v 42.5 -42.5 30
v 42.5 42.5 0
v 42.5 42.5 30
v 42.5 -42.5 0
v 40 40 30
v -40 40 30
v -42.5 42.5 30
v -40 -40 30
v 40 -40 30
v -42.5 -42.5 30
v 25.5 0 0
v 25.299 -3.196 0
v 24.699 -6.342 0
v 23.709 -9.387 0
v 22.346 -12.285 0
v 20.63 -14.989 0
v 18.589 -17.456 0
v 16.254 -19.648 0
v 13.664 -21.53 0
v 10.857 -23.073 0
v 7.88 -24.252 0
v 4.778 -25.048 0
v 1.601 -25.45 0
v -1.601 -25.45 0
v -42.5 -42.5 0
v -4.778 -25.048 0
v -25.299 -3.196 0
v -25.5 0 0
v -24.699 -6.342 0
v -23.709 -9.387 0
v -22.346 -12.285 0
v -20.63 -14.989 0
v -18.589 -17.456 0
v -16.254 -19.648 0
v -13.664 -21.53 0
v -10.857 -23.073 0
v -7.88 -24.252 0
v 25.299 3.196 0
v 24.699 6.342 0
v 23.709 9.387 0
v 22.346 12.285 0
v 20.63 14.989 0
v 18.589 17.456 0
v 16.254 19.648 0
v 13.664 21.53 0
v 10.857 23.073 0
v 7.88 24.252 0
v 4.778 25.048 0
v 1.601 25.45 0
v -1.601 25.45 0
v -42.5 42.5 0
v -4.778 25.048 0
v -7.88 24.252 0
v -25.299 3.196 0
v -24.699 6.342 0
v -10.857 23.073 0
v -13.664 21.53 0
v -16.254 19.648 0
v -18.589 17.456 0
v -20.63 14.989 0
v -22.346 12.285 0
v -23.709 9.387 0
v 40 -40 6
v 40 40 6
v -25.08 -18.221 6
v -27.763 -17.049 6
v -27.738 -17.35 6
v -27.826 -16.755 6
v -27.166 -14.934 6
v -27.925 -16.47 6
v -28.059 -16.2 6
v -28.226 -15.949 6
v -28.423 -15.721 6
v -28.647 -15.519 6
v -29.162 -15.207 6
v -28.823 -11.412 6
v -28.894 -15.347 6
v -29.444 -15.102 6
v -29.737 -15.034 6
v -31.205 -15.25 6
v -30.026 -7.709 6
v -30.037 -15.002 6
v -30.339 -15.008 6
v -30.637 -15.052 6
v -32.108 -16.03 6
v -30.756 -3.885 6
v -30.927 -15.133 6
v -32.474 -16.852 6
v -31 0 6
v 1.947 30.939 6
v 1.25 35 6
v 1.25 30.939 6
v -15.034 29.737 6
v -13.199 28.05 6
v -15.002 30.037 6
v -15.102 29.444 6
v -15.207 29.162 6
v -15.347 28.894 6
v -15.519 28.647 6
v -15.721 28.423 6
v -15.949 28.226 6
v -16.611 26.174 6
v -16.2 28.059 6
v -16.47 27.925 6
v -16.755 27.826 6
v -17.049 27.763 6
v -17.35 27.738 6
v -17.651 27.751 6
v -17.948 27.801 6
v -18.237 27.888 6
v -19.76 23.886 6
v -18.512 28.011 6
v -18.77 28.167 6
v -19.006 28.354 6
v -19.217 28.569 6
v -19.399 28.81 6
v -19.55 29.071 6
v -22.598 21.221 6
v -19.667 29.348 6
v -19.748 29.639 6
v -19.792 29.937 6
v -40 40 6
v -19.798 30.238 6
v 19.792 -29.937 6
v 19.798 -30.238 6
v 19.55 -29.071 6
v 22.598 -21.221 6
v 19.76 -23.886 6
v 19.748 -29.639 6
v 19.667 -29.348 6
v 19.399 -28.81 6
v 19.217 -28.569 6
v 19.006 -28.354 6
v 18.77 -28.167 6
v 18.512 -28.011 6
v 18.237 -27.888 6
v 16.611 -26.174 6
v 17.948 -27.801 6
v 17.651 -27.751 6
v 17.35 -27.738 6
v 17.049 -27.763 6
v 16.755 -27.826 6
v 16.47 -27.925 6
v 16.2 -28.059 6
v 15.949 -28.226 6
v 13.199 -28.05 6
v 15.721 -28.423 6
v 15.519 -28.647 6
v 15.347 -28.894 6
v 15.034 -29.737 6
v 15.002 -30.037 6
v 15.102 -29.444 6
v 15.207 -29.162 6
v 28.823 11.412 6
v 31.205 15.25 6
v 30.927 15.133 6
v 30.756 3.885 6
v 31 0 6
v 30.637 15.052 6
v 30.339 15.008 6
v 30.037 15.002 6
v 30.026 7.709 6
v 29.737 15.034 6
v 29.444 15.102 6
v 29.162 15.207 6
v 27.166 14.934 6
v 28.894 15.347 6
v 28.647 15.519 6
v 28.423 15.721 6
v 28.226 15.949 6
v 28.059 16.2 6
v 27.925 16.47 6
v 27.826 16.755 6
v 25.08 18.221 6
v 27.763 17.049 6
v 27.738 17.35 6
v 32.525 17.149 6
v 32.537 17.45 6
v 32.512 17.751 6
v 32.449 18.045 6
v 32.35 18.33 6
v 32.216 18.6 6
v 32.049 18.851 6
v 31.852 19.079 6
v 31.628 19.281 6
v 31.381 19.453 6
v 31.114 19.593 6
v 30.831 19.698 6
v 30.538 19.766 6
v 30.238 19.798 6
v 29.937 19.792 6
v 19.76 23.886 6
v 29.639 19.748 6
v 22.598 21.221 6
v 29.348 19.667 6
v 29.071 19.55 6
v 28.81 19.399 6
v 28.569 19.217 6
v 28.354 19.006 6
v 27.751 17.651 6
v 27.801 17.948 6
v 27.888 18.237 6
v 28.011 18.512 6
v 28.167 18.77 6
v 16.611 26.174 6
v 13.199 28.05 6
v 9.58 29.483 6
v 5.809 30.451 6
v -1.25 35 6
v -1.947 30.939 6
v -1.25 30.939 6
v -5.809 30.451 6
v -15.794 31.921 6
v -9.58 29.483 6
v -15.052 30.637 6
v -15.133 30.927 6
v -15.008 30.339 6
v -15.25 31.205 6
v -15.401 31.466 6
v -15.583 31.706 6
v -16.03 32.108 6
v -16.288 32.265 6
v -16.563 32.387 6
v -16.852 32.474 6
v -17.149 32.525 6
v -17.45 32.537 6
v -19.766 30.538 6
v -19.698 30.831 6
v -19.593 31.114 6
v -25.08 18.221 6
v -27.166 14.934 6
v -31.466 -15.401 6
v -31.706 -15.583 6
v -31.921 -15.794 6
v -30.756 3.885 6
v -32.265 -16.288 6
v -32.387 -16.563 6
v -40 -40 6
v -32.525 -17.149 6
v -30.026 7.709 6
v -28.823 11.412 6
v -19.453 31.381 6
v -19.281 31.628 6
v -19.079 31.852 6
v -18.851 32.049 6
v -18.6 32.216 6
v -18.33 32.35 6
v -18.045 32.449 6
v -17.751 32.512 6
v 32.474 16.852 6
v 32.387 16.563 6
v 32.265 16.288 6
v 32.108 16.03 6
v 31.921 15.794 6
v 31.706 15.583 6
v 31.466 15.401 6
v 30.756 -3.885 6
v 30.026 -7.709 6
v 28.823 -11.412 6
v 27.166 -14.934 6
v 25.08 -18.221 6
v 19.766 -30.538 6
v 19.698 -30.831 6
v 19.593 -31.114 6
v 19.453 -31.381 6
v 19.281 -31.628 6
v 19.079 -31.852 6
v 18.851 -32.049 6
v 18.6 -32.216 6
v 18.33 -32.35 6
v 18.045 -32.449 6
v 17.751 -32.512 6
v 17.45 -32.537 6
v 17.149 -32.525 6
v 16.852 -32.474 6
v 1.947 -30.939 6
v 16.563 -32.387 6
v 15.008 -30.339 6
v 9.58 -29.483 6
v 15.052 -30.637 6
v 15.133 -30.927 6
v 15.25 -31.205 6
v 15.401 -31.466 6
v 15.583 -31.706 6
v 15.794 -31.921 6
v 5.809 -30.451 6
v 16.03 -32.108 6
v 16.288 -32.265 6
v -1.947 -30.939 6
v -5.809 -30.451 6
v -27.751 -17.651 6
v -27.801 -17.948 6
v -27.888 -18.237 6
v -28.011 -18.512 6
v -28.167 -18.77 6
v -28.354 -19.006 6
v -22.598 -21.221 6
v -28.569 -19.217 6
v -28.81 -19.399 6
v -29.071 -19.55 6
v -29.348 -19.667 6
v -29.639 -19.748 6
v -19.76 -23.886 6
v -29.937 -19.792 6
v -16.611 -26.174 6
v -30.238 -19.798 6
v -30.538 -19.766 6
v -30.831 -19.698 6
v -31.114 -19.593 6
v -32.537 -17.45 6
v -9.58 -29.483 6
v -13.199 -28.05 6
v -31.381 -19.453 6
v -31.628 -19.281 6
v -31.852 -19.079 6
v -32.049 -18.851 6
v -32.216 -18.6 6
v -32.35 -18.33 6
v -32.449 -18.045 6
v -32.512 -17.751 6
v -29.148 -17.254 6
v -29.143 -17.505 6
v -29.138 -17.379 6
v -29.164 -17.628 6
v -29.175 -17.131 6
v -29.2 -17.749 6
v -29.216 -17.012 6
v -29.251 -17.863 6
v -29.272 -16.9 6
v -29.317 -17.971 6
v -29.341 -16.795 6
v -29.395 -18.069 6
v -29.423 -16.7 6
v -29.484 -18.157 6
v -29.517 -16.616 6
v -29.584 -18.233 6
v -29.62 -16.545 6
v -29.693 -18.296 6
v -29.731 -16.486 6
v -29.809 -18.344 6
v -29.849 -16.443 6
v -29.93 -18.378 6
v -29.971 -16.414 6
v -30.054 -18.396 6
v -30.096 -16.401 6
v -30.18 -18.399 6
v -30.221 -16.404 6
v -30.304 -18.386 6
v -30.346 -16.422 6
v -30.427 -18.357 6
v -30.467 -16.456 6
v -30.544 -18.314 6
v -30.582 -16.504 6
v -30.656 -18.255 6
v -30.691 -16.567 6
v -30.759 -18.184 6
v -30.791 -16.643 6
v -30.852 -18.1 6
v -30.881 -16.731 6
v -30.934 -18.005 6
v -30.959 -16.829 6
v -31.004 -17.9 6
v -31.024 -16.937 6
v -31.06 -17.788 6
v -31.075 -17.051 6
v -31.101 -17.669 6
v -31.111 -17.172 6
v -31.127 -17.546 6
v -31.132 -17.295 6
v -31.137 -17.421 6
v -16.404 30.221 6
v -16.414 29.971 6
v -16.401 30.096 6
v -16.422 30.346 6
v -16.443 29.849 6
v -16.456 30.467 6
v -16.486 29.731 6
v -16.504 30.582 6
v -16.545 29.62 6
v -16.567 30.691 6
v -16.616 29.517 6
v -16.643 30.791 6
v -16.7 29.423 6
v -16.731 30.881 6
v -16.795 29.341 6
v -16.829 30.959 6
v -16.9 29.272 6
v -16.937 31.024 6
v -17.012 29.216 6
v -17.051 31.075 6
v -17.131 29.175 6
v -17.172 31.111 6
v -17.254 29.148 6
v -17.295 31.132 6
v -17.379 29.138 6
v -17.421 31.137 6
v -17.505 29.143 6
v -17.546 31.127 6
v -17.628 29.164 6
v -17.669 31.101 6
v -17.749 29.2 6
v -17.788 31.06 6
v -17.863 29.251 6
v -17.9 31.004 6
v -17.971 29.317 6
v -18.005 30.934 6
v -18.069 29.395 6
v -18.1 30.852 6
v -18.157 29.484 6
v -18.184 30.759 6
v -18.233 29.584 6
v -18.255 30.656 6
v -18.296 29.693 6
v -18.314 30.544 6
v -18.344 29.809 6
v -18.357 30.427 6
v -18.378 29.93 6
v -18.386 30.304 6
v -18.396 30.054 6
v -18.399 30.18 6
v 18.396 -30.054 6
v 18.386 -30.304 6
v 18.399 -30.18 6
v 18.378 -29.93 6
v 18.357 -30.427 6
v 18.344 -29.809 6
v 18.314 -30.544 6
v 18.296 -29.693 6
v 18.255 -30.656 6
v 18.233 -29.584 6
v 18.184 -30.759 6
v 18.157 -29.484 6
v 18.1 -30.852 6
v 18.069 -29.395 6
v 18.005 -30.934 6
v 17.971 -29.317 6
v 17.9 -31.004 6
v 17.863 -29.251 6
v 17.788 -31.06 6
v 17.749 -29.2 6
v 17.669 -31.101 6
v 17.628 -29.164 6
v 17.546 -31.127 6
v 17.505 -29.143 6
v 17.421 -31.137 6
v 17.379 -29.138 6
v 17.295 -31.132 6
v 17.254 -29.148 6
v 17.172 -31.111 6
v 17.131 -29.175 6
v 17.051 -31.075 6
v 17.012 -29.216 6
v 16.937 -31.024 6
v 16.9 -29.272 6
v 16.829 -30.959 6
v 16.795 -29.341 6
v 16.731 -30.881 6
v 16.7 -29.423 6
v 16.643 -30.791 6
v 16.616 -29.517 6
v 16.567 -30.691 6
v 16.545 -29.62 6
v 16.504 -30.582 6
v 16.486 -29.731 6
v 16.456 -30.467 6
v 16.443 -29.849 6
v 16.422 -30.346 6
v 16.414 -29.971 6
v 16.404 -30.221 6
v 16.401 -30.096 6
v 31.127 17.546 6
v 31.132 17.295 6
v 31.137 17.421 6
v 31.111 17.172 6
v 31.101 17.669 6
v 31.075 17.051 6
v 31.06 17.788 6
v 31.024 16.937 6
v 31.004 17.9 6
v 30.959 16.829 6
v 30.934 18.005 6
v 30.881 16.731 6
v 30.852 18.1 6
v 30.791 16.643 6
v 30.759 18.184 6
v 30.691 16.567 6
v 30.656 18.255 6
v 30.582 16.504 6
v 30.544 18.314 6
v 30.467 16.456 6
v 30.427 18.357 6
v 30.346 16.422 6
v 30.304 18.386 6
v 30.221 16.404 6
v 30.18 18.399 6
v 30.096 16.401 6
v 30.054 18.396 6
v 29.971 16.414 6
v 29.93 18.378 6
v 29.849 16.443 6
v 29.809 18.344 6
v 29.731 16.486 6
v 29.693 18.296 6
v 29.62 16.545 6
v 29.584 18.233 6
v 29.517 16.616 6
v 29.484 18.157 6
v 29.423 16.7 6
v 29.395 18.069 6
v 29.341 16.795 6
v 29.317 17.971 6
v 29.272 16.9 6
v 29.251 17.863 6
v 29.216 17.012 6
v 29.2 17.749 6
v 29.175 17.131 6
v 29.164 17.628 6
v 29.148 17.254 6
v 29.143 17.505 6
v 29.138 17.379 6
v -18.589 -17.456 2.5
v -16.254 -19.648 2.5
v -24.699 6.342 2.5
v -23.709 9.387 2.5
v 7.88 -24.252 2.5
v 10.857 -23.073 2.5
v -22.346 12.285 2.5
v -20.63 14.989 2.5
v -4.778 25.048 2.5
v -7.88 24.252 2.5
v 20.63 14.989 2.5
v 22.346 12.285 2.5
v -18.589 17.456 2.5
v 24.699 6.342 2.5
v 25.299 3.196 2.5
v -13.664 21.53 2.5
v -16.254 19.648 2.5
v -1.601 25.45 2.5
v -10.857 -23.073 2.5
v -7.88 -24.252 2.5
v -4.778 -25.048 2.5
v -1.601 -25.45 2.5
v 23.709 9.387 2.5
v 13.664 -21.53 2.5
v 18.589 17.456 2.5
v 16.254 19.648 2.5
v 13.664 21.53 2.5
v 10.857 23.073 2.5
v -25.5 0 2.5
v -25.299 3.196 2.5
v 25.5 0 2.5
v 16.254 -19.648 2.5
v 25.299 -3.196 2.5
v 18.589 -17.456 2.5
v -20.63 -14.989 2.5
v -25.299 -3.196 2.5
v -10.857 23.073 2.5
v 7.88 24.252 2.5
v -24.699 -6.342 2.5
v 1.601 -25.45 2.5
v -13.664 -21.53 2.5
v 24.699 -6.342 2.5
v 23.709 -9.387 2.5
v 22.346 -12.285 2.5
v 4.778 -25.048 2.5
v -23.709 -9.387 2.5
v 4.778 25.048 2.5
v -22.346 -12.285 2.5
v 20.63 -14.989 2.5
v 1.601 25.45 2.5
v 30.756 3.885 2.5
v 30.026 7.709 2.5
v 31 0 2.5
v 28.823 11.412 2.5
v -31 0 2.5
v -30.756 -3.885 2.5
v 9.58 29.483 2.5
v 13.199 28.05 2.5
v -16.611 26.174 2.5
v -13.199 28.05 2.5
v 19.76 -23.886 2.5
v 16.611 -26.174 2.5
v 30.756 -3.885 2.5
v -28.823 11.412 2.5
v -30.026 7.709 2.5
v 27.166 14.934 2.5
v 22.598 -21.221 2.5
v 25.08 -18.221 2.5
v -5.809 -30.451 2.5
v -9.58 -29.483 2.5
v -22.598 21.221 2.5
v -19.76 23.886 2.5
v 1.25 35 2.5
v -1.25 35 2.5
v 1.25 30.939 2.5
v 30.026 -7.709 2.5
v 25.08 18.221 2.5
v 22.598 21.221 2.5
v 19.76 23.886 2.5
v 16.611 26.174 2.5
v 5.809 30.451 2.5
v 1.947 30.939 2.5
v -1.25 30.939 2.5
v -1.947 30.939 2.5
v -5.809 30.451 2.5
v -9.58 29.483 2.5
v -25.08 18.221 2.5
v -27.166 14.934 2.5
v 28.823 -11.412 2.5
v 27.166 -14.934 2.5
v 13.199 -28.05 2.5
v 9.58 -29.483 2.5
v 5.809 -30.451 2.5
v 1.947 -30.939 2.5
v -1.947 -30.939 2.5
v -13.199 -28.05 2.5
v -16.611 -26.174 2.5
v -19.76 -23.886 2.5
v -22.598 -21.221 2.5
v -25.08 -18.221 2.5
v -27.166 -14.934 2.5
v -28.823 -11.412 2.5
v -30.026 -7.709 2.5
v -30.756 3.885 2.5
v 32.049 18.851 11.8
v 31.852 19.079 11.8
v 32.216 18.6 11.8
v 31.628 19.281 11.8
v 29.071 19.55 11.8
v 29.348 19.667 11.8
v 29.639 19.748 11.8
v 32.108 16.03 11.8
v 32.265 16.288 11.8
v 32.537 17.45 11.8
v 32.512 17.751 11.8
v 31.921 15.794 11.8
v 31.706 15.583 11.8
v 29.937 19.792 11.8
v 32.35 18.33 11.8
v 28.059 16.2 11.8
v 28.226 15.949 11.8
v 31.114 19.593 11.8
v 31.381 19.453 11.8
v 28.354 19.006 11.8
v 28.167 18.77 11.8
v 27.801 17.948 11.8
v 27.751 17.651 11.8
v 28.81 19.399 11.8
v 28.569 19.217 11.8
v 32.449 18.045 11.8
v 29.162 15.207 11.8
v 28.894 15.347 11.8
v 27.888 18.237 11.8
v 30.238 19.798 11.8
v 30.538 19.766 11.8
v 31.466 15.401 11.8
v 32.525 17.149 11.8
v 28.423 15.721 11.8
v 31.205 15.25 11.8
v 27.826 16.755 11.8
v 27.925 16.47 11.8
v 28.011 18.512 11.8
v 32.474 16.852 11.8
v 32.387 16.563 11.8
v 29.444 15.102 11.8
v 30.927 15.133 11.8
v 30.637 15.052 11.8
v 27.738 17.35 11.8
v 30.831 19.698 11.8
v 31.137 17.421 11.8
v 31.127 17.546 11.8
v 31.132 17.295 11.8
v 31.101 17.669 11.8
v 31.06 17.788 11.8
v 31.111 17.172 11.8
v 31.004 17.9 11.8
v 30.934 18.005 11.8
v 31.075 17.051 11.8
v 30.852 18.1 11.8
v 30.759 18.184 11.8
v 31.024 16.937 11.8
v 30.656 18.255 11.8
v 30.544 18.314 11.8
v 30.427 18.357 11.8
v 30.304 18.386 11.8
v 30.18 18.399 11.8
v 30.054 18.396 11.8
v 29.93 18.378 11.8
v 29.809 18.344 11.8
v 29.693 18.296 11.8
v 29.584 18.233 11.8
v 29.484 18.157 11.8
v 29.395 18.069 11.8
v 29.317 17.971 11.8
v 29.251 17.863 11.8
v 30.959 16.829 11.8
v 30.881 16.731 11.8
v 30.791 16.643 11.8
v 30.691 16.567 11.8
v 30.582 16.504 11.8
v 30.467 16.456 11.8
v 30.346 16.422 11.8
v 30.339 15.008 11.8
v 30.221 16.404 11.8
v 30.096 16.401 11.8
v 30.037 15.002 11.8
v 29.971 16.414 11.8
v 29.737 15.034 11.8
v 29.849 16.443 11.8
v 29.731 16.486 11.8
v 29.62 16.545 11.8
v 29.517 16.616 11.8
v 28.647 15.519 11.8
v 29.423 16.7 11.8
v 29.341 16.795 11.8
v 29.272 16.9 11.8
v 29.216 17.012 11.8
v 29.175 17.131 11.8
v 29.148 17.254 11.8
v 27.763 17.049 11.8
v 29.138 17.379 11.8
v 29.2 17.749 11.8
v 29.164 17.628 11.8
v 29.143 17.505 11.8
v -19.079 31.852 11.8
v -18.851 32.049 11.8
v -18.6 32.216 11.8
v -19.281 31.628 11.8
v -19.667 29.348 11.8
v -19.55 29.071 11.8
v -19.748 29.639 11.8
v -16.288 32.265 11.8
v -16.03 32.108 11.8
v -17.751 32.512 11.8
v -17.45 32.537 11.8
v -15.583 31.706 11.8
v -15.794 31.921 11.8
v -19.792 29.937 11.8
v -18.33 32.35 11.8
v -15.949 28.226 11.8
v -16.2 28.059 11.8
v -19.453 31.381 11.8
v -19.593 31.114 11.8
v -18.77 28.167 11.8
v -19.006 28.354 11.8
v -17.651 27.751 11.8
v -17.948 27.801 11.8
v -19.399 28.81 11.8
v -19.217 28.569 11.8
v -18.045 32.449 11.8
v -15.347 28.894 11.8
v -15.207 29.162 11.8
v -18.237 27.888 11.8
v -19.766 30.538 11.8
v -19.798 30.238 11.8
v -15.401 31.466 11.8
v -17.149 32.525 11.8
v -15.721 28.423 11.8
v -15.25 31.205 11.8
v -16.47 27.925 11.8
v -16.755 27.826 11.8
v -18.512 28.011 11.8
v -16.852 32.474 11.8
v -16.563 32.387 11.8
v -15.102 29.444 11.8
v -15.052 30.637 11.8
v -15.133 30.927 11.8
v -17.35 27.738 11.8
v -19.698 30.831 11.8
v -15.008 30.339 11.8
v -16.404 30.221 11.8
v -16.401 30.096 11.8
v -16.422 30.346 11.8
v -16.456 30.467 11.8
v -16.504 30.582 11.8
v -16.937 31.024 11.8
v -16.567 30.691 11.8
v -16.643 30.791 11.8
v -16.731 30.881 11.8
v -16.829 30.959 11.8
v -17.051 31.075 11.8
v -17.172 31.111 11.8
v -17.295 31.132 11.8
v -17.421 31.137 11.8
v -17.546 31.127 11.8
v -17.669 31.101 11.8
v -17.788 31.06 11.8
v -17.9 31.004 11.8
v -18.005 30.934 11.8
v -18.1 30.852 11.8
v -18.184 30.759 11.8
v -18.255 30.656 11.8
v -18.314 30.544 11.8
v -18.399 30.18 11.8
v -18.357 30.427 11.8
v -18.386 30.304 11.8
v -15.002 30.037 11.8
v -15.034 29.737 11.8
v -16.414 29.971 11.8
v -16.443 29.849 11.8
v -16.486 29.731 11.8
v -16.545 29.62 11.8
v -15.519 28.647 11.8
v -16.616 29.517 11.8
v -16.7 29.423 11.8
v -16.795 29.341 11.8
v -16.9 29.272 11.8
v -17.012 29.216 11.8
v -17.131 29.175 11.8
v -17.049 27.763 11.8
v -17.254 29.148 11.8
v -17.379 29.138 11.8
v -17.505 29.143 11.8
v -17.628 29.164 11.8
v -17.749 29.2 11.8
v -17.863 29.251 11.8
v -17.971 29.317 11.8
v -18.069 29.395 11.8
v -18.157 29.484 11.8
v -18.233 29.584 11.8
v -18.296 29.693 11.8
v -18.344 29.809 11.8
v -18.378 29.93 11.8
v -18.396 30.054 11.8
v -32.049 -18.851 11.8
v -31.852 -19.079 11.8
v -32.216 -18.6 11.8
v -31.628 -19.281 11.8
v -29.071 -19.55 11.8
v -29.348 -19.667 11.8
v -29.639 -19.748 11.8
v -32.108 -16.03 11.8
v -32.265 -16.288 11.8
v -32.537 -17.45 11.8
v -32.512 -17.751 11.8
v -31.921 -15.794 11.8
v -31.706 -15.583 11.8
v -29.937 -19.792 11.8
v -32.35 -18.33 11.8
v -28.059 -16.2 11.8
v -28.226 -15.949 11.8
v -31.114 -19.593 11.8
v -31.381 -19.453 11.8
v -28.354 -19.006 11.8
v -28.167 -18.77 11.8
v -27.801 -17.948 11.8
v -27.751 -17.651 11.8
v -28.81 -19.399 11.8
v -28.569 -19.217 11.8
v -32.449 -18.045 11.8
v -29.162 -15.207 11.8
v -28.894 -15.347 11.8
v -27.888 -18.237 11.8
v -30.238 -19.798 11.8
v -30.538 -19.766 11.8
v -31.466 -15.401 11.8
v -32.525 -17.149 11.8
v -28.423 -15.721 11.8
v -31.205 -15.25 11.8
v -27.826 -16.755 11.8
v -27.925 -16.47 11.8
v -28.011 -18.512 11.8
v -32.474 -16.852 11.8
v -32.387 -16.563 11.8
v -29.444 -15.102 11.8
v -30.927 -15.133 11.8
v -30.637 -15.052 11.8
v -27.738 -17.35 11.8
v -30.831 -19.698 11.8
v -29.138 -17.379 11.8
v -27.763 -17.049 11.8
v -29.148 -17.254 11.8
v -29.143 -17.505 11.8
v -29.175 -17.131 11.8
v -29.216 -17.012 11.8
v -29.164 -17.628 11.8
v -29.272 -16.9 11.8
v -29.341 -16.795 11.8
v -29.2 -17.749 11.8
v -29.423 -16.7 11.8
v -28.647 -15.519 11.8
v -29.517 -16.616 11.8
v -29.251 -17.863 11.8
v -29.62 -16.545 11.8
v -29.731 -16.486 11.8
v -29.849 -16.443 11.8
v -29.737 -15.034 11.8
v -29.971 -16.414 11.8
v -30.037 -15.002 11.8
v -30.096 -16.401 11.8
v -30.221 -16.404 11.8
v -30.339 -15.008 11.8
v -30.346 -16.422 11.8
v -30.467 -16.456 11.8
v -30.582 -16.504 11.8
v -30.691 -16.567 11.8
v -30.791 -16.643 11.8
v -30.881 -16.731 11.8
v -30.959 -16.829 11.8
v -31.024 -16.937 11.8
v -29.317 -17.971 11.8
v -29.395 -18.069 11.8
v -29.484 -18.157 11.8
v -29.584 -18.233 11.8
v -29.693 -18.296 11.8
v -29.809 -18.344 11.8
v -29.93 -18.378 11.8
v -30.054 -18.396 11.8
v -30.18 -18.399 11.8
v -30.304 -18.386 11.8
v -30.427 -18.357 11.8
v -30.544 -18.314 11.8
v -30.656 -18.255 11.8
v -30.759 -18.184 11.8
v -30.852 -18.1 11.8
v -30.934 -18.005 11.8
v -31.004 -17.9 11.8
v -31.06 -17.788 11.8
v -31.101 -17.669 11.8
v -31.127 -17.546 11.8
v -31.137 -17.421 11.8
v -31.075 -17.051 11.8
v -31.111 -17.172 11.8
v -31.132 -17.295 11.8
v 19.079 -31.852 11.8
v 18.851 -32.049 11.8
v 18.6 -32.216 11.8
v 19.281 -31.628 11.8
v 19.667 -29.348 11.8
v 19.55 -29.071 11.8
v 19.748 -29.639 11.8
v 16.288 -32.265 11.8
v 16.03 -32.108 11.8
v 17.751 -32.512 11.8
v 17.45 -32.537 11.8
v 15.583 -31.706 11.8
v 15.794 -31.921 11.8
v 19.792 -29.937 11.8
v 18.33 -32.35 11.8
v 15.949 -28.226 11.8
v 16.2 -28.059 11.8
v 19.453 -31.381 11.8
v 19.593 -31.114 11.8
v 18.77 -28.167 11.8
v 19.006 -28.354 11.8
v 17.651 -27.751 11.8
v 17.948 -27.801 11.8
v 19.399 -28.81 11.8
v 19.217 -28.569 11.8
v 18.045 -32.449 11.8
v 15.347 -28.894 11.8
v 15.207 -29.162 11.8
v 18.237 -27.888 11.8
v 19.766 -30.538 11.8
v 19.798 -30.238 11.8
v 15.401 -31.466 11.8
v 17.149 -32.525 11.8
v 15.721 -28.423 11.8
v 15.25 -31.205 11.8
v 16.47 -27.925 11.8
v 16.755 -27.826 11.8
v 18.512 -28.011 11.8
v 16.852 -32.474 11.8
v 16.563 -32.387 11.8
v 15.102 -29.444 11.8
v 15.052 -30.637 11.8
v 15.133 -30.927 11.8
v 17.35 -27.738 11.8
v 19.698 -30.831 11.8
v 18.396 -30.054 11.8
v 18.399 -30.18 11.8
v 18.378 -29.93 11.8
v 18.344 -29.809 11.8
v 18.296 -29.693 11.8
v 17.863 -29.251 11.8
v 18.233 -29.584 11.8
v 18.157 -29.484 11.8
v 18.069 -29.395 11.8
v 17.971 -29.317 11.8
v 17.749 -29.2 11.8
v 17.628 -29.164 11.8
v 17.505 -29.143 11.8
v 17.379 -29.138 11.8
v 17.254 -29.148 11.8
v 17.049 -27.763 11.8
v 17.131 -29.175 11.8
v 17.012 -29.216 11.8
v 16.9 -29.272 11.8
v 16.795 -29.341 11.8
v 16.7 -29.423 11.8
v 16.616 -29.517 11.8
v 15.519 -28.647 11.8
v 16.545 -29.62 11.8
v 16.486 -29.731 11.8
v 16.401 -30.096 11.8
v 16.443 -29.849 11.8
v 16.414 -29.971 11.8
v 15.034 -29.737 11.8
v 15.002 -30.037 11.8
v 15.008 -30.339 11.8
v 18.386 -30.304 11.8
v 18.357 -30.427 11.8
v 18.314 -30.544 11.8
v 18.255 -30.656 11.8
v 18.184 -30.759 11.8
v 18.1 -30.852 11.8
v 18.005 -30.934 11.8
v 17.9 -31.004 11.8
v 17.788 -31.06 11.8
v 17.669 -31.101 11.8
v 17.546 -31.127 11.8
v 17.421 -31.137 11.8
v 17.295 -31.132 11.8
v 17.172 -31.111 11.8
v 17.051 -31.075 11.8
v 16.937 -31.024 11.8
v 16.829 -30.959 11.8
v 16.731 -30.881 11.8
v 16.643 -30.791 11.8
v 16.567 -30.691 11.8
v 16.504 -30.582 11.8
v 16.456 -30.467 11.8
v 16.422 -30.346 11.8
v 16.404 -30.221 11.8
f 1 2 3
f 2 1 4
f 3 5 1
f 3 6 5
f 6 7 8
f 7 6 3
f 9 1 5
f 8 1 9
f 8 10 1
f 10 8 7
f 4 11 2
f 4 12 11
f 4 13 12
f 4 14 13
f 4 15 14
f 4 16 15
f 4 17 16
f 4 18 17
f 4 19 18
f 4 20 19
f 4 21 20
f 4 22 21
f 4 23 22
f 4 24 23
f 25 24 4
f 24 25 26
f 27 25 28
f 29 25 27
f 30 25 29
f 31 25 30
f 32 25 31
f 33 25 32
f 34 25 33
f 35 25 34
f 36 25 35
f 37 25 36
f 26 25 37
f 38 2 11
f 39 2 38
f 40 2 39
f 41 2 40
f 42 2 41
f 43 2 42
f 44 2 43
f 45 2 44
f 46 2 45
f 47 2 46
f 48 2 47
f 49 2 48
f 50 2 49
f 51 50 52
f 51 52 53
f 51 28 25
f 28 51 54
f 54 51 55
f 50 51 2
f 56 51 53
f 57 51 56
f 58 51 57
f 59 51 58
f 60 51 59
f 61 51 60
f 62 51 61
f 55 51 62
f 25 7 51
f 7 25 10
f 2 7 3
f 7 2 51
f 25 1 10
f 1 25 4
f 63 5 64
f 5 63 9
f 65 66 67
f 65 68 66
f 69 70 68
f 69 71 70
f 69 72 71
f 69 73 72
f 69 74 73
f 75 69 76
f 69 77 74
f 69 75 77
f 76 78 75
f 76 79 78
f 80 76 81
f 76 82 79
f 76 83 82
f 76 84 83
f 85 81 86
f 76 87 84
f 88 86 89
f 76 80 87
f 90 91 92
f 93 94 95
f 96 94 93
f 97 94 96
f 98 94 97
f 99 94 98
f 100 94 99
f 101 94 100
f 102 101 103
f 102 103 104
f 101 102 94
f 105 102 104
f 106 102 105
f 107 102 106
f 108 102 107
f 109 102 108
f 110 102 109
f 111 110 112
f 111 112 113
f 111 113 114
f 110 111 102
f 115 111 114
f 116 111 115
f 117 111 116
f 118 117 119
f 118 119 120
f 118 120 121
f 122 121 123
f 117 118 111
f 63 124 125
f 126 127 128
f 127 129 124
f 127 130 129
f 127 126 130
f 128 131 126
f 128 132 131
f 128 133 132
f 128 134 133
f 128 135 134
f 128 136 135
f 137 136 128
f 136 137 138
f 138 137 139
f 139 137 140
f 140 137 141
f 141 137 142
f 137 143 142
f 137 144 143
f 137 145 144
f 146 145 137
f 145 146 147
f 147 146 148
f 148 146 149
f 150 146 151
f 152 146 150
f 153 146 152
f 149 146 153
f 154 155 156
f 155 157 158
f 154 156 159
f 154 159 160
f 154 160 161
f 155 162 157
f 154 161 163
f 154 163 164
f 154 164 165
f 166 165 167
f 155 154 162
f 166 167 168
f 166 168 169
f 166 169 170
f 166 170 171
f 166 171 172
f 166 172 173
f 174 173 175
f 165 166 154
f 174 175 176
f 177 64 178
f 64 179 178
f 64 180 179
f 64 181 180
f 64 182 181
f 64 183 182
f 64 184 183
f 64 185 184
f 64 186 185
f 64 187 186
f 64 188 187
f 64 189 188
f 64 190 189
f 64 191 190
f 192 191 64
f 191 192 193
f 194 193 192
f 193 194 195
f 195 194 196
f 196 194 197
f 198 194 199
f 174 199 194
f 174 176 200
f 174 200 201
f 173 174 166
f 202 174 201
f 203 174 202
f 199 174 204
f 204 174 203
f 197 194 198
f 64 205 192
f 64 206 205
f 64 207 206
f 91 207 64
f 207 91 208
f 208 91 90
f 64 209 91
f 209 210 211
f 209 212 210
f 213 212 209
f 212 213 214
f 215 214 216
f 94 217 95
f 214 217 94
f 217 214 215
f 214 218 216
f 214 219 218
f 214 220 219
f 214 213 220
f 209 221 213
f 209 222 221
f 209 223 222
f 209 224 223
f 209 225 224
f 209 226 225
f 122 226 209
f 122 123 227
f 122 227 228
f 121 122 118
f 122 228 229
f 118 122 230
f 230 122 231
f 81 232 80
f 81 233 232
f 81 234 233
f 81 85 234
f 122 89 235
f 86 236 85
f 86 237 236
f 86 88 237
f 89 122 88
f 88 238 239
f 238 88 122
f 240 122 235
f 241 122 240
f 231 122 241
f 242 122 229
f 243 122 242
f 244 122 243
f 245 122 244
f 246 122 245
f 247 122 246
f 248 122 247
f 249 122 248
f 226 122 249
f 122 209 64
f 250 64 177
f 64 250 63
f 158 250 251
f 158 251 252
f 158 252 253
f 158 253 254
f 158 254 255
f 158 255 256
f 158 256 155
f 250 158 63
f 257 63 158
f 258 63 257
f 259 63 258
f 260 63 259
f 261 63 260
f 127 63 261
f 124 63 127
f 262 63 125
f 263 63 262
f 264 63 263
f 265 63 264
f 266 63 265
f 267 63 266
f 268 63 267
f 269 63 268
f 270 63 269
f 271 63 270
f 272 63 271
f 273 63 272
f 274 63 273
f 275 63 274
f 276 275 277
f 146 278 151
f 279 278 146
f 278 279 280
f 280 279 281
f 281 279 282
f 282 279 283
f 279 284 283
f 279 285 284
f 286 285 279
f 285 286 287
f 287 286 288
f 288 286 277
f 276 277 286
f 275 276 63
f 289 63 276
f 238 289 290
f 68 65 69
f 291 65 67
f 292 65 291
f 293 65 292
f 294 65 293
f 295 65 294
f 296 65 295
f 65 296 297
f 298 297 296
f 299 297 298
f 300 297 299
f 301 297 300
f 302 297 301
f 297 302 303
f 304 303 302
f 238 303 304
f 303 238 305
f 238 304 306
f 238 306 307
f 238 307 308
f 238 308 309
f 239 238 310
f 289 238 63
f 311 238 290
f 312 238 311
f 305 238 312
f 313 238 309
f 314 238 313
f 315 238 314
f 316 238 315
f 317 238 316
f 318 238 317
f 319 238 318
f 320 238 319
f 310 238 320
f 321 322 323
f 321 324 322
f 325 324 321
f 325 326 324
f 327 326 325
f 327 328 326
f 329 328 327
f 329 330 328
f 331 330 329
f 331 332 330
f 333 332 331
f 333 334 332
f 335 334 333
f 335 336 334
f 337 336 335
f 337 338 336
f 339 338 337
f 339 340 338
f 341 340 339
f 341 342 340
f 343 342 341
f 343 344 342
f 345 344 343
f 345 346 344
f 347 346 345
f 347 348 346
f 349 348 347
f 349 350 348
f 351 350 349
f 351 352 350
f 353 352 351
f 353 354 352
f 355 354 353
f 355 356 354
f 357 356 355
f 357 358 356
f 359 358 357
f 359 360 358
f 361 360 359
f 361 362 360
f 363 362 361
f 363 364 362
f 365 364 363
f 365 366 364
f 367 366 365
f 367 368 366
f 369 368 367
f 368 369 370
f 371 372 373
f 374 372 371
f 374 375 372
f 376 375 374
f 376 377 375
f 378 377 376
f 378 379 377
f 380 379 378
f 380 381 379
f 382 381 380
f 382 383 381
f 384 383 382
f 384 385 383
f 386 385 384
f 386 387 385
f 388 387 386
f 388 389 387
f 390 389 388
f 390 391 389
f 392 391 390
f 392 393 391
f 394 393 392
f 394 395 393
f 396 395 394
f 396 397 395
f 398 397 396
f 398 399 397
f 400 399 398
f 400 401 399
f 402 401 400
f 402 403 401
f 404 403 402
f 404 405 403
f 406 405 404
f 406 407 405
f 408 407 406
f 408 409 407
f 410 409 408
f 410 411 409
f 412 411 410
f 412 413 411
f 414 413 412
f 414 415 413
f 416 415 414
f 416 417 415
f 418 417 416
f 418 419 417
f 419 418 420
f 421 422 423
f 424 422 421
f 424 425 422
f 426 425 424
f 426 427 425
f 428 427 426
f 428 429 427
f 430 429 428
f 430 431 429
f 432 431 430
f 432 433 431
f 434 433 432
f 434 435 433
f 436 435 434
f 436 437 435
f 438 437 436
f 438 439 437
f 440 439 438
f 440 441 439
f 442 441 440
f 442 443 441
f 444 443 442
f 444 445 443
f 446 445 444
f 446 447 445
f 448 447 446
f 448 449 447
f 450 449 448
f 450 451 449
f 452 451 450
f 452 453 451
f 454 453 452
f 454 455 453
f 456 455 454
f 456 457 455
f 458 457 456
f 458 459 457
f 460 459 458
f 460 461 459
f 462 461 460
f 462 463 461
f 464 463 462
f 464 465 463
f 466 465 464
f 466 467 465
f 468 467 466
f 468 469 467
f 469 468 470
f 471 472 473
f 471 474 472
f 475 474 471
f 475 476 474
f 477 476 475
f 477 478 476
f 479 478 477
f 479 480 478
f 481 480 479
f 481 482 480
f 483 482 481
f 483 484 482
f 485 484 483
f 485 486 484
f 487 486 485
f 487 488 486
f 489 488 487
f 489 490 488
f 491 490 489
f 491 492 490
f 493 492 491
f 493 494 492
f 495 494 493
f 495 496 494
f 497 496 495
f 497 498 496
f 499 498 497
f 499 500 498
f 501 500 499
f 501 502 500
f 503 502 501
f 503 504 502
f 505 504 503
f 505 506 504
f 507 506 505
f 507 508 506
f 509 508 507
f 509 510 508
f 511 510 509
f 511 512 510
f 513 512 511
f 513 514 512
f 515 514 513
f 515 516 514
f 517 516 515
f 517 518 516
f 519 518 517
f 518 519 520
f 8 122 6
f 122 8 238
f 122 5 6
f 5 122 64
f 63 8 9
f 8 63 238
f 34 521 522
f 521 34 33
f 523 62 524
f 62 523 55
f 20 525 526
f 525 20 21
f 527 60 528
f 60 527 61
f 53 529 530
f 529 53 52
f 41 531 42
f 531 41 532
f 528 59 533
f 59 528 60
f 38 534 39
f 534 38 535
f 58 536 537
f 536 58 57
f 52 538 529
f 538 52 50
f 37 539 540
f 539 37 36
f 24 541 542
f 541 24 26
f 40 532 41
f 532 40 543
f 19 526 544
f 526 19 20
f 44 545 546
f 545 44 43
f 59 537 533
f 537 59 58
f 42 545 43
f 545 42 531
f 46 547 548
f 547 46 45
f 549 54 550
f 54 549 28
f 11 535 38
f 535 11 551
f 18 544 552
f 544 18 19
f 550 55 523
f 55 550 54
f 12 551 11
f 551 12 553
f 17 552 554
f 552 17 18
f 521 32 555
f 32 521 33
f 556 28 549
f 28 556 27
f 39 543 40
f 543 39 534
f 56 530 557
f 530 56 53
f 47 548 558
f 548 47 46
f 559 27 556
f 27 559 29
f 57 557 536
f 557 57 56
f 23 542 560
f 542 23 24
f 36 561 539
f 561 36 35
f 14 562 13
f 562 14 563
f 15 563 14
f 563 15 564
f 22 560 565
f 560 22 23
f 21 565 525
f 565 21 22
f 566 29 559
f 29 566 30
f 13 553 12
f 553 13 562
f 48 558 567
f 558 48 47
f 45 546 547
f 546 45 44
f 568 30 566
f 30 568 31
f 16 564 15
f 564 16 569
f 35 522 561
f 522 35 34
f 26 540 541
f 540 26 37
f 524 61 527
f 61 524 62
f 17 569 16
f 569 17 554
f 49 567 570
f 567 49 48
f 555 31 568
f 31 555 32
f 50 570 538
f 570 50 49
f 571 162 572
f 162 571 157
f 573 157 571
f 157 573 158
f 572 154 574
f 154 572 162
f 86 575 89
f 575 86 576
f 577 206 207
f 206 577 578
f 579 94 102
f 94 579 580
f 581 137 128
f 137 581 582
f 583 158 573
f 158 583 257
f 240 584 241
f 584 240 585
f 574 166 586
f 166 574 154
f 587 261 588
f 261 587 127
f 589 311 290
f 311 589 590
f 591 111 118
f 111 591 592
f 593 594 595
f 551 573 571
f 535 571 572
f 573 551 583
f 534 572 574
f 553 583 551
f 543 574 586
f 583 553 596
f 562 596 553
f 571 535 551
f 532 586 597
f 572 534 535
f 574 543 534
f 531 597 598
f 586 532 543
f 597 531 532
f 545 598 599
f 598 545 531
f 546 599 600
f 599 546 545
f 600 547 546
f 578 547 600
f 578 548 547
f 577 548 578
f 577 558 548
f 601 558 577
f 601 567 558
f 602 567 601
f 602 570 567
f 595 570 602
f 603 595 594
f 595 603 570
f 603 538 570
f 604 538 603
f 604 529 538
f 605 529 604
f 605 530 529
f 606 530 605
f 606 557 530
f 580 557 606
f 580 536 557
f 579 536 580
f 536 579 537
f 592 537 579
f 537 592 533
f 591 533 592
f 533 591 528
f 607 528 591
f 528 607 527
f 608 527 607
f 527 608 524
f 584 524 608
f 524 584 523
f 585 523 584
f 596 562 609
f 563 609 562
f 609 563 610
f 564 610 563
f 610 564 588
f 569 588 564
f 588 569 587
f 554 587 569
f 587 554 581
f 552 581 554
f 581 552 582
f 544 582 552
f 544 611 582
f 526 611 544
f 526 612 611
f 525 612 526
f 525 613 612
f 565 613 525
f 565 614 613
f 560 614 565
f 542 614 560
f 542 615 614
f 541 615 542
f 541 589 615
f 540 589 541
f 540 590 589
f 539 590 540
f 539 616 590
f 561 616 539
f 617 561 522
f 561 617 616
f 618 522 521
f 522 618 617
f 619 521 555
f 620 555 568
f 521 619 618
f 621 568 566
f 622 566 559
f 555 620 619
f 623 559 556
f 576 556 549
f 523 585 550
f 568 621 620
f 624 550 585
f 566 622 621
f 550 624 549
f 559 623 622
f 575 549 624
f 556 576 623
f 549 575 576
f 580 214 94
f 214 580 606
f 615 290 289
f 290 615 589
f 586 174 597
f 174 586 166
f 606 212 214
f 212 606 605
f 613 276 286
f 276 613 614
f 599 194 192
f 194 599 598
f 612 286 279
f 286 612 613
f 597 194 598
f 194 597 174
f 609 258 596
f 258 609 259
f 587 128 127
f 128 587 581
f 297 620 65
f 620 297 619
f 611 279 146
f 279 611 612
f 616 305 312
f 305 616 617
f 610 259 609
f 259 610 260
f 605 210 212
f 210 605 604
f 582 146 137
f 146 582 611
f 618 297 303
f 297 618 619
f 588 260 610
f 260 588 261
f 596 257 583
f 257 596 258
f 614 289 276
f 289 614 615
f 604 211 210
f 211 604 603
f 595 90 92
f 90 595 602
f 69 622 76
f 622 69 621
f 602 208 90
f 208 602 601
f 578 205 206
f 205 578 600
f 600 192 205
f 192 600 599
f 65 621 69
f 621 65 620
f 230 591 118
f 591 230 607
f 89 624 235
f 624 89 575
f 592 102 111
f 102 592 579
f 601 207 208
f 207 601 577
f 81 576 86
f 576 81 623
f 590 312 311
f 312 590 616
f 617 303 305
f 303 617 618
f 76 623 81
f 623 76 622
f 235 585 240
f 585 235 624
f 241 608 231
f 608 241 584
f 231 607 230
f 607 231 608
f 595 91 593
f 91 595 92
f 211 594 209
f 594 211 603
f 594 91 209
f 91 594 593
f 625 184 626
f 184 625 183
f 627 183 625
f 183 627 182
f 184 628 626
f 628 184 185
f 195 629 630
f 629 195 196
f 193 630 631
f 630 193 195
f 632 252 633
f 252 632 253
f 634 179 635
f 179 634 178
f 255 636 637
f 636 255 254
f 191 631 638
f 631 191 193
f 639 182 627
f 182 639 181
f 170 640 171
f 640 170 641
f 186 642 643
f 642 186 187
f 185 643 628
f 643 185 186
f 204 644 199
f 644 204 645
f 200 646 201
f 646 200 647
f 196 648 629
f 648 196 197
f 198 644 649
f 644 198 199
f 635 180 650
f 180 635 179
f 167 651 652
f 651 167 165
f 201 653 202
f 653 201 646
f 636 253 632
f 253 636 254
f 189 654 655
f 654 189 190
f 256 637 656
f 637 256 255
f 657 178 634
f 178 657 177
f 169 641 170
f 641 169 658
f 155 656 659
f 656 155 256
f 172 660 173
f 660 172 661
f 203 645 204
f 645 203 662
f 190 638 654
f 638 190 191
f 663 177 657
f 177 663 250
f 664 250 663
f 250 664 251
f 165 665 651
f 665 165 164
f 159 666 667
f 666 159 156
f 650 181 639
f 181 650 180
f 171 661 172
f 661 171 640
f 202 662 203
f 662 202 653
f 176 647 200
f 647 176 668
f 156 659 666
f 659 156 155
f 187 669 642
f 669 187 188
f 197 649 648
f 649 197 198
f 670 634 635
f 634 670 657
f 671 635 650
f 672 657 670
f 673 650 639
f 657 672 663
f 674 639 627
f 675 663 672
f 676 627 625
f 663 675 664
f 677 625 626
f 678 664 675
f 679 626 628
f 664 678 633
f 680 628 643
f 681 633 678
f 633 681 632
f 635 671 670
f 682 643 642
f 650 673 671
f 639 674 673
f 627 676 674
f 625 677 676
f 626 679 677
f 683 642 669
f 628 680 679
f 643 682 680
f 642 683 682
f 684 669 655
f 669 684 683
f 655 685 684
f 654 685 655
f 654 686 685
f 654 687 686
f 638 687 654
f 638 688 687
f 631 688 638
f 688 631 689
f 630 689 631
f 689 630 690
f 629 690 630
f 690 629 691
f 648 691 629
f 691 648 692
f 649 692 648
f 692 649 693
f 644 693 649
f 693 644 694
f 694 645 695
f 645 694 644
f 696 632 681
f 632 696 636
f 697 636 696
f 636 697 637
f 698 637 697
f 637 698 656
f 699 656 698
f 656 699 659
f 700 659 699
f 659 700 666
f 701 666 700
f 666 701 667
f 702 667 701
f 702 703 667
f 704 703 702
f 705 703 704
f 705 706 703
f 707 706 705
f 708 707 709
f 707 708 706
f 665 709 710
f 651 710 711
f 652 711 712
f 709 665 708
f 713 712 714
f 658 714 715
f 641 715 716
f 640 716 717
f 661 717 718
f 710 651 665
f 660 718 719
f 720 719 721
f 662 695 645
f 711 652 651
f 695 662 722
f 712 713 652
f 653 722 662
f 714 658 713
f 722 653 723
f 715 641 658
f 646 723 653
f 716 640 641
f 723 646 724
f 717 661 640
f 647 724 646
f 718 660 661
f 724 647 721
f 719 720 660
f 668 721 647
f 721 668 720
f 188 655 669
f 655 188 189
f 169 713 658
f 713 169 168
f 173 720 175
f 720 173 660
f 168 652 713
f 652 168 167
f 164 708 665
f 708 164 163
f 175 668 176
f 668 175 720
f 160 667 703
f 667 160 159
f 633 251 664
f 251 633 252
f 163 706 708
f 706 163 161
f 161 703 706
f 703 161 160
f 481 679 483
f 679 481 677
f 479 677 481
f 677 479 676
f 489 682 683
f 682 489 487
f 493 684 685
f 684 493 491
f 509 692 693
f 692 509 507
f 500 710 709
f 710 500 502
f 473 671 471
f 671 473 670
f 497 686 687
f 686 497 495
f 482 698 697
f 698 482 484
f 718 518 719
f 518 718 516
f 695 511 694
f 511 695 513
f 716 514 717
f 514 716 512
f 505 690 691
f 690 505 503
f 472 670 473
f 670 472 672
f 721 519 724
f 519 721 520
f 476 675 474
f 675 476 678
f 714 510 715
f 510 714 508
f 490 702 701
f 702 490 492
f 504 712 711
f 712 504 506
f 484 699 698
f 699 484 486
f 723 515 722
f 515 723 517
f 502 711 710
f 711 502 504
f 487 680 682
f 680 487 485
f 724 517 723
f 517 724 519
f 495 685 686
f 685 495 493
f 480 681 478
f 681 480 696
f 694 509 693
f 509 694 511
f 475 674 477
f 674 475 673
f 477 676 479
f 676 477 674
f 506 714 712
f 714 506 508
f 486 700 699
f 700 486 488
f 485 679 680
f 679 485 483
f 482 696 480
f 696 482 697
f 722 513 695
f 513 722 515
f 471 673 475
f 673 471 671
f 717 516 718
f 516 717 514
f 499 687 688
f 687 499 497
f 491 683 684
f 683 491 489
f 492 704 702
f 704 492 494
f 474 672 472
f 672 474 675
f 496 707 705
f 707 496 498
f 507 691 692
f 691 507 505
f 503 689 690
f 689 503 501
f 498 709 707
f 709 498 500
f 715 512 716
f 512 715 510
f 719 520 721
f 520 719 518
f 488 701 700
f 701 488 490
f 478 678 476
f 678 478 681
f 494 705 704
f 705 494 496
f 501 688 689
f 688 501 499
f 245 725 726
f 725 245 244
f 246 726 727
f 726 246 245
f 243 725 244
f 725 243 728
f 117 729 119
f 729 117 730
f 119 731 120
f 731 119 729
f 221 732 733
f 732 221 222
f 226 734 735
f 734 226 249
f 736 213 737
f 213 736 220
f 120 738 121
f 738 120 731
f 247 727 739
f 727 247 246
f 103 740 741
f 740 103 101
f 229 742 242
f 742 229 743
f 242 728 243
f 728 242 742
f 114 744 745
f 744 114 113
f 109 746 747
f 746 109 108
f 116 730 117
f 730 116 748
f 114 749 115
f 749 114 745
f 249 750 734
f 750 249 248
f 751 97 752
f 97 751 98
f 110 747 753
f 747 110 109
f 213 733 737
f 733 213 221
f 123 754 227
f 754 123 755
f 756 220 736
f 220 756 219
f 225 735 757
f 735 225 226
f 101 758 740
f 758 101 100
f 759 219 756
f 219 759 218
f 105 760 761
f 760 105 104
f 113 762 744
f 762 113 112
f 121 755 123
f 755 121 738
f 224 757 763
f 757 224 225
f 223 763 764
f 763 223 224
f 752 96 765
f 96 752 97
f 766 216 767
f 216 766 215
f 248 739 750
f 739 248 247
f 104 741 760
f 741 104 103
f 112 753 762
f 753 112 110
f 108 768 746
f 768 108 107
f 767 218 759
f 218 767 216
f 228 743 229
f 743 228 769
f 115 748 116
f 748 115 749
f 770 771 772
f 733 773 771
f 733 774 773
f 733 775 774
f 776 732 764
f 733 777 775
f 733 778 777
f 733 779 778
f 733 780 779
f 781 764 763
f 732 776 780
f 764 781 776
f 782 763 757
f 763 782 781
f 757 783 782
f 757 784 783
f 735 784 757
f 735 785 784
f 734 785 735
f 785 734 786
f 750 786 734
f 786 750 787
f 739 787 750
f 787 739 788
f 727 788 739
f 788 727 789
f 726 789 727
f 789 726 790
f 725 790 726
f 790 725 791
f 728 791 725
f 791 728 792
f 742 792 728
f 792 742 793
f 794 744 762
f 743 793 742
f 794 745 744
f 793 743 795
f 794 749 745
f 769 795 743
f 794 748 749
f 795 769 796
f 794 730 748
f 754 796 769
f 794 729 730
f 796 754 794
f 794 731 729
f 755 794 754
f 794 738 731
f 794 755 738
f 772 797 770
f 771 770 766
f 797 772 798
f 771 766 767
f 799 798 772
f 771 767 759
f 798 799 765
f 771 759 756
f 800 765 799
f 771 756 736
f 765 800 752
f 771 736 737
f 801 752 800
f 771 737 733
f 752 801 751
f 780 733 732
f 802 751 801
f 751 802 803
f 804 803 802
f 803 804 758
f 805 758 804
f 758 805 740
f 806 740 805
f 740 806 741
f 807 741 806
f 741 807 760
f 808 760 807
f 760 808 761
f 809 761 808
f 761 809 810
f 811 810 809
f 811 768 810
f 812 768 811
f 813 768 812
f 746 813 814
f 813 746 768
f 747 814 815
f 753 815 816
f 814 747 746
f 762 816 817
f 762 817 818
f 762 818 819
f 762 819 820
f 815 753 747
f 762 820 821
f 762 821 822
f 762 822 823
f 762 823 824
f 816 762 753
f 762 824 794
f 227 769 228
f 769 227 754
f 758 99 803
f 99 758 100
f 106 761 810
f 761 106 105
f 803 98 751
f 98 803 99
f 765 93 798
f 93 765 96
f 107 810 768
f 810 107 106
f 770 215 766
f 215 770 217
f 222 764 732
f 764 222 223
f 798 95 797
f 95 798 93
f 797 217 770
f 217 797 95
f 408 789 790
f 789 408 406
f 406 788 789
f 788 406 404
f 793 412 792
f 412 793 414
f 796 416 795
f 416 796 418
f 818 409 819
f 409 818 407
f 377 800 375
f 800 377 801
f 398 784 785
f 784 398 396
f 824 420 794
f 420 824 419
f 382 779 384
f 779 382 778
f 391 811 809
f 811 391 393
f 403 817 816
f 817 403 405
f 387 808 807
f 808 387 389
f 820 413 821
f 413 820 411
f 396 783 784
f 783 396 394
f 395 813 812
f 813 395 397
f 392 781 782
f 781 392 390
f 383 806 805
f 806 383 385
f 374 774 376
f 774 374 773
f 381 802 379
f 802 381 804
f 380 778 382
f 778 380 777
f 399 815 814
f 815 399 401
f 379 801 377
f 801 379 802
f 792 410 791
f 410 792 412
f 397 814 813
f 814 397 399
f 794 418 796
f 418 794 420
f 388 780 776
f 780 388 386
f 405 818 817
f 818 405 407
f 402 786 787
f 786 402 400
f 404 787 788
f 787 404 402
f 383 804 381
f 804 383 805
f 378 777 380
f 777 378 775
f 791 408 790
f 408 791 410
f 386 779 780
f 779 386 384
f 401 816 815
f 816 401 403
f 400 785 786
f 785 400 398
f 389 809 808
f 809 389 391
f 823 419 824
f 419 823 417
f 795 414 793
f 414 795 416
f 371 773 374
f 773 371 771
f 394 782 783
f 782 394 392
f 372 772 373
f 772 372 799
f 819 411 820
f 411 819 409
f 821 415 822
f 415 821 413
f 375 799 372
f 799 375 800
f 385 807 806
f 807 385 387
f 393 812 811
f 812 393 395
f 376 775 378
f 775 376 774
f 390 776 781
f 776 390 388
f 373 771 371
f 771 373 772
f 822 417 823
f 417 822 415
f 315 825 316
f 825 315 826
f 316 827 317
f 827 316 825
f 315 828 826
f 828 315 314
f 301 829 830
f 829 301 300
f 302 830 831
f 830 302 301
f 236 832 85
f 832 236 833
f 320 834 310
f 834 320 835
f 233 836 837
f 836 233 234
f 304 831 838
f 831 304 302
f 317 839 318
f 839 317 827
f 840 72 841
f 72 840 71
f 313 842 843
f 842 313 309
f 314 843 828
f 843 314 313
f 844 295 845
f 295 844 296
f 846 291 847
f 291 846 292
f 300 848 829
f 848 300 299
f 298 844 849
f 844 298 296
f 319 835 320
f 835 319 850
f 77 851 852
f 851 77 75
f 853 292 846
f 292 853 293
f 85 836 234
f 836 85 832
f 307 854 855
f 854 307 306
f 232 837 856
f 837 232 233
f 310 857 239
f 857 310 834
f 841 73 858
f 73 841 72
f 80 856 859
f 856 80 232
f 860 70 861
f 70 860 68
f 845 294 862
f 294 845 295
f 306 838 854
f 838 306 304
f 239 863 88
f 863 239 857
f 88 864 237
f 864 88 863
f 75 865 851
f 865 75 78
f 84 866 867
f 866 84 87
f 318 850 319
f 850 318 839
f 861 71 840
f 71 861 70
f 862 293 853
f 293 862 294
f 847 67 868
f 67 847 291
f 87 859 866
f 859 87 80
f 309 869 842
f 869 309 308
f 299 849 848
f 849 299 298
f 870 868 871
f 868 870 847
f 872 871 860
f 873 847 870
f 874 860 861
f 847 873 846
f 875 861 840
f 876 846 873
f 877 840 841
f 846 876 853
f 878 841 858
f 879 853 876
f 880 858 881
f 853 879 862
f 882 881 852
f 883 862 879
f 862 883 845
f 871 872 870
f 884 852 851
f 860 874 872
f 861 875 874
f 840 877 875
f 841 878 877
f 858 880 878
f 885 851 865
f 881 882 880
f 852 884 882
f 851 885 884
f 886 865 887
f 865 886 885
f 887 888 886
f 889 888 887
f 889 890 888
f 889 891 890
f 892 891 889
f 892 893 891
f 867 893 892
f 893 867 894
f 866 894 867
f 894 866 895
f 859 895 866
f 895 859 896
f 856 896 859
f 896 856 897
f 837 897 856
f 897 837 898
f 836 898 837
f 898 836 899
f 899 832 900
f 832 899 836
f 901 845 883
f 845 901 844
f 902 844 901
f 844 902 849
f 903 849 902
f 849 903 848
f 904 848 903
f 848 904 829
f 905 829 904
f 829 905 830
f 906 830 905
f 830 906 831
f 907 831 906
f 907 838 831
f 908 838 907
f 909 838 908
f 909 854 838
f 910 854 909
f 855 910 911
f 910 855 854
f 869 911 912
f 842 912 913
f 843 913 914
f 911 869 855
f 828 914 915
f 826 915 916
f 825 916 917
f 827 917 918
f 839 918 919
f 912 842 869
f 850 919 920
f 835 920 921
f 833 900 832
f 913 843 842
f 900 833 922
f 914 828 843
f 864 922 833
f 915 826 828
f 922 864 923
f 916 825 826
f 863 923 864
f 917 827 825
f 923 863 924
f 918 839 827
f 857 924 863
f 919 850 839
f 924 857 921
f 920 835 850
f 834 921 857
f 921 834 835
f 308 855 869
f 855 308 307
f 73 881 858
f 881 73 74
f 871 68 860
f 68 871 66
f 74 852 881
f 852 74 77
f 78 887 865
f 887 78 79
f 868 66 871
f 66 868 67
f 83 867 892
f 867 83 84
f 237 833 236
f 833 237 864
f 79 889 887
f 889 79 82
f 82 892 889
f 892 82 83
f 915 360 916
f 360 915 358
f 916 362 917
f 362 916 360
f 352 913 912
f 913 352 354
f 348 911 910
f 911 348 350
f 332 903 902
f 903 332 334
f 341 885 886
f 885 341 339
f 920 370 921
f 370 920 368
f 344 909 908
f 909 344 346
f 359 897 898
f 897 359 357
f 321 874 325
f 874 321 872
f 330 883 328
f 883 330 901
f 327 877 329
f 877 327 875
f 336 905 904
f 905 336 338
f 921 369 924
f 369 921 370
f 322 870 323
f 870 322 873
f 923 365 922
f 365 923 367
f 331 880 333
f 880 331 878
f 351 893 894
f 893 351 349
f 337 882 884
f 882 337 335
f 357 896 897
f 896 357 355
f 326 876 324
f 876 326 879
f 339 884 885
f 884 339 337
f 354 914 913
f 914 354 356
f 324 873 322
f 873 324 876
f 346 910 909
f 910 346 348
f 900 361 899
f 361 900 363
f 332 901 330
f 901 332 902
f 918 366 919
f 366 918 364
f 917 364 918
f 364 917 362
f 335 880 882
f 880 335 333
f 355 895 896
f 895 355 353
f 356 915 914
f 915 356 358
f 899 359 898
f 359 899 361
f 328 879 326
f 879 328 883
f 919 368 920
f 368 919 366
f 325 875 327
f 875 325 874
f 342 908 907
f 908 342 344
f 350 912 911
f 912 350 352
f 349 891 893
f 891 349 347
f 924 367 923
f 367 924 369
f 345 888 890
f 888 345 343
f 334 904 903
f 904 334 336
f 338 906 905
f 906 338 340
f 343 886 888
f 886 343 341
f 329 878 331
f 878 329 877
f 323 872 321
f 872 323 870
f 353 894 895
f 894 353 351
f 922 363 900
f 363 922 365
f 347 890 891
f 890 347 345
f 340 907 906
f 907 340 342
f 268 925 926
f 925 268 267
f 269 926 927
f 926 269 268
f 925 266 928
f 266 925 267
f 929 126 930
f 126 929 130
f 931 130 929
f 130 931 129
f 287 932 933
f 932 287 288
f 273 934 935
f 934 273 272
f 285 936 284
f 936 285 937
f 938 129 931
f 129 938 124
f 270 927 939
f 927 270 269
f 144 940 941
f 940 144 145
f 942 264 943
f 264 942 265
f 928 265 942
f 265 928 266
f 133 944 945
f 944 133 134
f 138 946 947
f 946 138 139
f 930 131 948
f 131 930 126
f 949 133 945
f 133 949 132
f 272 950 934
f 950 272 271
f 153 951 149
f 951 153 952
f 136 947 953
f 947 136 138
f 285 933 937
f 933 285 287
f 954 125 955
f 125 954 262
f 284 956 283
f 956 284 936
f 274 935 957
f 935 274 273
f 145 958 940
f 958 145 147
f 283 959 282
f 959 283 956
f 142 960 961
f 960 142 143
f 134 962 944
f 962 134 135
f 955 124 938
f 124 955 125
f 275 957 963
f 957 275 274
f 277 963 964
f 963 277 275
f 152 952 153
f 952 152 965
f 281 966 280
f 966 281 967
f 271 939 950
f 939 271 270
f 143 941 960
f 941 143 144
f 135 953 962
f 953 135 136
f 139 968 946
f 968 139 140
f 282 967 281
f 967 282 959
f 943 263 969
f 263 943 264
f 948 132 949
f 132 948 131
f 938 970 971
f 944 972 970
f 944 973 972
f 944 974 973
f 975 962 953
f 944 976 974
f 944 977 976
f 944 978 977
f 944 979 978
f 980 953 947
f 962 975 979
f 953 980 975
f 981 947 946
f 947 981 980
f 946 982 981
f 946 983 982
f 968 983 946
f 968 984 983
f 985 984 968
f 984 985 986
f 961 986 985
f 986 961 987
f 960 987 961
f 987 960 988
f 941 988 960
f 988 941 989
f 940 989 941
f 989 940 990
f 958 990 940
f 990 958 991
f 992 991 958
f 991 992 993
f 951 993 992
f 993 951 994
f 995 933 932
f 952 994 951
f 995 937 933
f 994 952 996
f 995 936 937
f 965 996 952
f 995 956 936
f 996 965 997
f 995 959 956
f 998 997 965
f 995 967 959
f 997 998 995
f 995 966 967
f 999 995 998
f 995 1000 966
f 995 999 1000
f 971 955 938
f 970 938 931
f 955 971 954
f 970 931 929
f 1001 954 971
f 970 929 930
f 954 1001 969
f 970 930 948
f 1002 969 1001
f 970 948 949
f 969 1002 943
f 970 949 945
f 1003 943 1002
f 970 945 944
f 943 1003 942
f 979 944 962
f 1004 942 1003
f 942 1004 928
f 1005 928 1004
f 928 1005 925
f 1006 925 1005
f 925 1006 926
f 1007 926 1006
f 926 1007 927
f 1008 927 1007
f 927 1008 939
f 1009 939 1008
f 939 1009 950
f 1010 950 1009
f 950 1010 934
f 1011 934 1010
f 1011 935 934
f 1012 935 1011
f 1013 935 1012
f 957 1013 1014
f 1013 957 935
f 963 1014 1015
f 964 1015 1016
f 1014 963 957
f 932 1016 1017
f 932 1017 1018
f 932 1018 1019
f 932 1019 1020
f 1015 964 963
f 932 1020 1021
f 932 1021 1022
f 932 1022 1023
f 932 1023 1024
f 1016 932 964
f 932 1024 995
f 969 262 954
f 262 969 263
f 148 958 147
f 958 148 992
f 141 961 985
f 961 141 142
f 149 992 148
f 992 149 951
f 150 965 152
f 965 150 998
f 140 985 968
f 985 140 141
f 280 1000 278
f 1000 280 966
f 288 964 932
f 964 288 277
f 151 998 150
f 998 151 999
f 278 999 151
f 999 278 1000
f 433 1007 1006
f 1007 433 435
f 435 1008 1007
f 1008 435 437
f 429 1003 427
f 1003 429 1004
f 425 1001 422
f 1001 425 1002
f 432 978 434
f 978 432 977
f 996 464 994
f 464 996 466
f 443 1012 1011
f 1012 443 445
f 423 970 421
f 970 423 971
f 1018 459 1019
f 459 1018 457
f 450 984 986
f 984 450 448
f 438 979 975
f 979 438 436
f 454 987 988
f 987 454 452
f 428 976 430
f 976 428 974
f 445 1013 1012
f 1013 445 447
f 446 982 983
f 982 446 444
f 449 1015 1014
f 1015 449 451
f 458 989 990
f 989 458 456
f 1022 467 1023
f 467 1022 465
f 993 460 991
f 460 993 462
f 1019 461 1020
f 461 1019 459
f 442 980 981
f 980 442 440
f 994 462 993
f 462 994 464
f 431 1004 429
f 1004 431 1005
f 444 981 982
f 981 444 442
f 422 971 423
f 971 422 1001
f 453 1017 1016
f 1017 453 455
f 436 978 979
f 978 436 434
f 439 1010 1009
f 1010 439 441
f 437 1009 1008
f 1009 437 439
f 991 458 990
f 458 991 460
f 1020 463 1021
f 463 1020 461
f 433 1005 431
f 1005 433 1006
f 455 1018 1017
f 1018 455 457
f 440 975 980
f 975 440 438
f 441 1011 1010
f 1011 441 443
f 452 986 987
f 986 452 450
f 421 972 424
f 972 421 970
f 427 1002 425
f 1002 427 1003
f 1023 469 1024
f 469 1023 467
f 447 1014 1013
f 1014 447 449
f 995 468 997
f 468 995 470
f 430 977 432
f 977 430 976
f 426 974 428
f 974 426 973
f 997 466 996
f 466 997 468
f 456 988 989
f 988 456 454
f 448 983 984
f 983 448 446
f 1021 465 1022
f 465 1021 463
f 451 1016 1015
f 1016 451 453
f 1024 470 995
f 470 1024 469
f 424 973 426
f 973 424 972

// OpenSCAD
rd = 51;     // ring diameter
rh = 2.8;    // ring height
od = 62;     // outer diamter
ot = 3.5;     // outer thickness
md = 69.6;   // mount circle diameter
ma = 30;     // mount offset angle (check)
mh = 9.3;  // mount height (below outer)
mod = 4.8;  // mount cylinder diameter
mid = 2; // mount cylinder inner

tl = 4;      // tag length
tw = 2.5;      // tag width

ow = 80;     // overall width internal
oh = 25;     // overall height internal
wt = 2.5;      // wall thickness

$fn=50;

difference() {
    translate([0,0,oh/2+wt]) cube([ow+wt*2,ow+wt*2,oh+wt*2],center=true);
    translate([0,0,50+ot+wt]) cube([ow,ow,100], center=true);
    cylinder(d=rd, h=100);
    translate([0,0,wt]) cylinder(d=od,h=oh/2);
    translate([0,tl,wt+ot/2]) cube([tw,od,ot], center=true);
}
for (a=[ma,ma+90,ma+180,ma+270]) {
    rotate([0,0,a])
    translate([md/2,0,wt]) {
        difference() {
            cylinder(d=mod,h=mh);
            cylinder(d=mid,h=mh);
        }
    }
}
//difference() {
//    translate([oh/2-ot,0,0]) cylinder(d=od+tl/2,h=ot])
